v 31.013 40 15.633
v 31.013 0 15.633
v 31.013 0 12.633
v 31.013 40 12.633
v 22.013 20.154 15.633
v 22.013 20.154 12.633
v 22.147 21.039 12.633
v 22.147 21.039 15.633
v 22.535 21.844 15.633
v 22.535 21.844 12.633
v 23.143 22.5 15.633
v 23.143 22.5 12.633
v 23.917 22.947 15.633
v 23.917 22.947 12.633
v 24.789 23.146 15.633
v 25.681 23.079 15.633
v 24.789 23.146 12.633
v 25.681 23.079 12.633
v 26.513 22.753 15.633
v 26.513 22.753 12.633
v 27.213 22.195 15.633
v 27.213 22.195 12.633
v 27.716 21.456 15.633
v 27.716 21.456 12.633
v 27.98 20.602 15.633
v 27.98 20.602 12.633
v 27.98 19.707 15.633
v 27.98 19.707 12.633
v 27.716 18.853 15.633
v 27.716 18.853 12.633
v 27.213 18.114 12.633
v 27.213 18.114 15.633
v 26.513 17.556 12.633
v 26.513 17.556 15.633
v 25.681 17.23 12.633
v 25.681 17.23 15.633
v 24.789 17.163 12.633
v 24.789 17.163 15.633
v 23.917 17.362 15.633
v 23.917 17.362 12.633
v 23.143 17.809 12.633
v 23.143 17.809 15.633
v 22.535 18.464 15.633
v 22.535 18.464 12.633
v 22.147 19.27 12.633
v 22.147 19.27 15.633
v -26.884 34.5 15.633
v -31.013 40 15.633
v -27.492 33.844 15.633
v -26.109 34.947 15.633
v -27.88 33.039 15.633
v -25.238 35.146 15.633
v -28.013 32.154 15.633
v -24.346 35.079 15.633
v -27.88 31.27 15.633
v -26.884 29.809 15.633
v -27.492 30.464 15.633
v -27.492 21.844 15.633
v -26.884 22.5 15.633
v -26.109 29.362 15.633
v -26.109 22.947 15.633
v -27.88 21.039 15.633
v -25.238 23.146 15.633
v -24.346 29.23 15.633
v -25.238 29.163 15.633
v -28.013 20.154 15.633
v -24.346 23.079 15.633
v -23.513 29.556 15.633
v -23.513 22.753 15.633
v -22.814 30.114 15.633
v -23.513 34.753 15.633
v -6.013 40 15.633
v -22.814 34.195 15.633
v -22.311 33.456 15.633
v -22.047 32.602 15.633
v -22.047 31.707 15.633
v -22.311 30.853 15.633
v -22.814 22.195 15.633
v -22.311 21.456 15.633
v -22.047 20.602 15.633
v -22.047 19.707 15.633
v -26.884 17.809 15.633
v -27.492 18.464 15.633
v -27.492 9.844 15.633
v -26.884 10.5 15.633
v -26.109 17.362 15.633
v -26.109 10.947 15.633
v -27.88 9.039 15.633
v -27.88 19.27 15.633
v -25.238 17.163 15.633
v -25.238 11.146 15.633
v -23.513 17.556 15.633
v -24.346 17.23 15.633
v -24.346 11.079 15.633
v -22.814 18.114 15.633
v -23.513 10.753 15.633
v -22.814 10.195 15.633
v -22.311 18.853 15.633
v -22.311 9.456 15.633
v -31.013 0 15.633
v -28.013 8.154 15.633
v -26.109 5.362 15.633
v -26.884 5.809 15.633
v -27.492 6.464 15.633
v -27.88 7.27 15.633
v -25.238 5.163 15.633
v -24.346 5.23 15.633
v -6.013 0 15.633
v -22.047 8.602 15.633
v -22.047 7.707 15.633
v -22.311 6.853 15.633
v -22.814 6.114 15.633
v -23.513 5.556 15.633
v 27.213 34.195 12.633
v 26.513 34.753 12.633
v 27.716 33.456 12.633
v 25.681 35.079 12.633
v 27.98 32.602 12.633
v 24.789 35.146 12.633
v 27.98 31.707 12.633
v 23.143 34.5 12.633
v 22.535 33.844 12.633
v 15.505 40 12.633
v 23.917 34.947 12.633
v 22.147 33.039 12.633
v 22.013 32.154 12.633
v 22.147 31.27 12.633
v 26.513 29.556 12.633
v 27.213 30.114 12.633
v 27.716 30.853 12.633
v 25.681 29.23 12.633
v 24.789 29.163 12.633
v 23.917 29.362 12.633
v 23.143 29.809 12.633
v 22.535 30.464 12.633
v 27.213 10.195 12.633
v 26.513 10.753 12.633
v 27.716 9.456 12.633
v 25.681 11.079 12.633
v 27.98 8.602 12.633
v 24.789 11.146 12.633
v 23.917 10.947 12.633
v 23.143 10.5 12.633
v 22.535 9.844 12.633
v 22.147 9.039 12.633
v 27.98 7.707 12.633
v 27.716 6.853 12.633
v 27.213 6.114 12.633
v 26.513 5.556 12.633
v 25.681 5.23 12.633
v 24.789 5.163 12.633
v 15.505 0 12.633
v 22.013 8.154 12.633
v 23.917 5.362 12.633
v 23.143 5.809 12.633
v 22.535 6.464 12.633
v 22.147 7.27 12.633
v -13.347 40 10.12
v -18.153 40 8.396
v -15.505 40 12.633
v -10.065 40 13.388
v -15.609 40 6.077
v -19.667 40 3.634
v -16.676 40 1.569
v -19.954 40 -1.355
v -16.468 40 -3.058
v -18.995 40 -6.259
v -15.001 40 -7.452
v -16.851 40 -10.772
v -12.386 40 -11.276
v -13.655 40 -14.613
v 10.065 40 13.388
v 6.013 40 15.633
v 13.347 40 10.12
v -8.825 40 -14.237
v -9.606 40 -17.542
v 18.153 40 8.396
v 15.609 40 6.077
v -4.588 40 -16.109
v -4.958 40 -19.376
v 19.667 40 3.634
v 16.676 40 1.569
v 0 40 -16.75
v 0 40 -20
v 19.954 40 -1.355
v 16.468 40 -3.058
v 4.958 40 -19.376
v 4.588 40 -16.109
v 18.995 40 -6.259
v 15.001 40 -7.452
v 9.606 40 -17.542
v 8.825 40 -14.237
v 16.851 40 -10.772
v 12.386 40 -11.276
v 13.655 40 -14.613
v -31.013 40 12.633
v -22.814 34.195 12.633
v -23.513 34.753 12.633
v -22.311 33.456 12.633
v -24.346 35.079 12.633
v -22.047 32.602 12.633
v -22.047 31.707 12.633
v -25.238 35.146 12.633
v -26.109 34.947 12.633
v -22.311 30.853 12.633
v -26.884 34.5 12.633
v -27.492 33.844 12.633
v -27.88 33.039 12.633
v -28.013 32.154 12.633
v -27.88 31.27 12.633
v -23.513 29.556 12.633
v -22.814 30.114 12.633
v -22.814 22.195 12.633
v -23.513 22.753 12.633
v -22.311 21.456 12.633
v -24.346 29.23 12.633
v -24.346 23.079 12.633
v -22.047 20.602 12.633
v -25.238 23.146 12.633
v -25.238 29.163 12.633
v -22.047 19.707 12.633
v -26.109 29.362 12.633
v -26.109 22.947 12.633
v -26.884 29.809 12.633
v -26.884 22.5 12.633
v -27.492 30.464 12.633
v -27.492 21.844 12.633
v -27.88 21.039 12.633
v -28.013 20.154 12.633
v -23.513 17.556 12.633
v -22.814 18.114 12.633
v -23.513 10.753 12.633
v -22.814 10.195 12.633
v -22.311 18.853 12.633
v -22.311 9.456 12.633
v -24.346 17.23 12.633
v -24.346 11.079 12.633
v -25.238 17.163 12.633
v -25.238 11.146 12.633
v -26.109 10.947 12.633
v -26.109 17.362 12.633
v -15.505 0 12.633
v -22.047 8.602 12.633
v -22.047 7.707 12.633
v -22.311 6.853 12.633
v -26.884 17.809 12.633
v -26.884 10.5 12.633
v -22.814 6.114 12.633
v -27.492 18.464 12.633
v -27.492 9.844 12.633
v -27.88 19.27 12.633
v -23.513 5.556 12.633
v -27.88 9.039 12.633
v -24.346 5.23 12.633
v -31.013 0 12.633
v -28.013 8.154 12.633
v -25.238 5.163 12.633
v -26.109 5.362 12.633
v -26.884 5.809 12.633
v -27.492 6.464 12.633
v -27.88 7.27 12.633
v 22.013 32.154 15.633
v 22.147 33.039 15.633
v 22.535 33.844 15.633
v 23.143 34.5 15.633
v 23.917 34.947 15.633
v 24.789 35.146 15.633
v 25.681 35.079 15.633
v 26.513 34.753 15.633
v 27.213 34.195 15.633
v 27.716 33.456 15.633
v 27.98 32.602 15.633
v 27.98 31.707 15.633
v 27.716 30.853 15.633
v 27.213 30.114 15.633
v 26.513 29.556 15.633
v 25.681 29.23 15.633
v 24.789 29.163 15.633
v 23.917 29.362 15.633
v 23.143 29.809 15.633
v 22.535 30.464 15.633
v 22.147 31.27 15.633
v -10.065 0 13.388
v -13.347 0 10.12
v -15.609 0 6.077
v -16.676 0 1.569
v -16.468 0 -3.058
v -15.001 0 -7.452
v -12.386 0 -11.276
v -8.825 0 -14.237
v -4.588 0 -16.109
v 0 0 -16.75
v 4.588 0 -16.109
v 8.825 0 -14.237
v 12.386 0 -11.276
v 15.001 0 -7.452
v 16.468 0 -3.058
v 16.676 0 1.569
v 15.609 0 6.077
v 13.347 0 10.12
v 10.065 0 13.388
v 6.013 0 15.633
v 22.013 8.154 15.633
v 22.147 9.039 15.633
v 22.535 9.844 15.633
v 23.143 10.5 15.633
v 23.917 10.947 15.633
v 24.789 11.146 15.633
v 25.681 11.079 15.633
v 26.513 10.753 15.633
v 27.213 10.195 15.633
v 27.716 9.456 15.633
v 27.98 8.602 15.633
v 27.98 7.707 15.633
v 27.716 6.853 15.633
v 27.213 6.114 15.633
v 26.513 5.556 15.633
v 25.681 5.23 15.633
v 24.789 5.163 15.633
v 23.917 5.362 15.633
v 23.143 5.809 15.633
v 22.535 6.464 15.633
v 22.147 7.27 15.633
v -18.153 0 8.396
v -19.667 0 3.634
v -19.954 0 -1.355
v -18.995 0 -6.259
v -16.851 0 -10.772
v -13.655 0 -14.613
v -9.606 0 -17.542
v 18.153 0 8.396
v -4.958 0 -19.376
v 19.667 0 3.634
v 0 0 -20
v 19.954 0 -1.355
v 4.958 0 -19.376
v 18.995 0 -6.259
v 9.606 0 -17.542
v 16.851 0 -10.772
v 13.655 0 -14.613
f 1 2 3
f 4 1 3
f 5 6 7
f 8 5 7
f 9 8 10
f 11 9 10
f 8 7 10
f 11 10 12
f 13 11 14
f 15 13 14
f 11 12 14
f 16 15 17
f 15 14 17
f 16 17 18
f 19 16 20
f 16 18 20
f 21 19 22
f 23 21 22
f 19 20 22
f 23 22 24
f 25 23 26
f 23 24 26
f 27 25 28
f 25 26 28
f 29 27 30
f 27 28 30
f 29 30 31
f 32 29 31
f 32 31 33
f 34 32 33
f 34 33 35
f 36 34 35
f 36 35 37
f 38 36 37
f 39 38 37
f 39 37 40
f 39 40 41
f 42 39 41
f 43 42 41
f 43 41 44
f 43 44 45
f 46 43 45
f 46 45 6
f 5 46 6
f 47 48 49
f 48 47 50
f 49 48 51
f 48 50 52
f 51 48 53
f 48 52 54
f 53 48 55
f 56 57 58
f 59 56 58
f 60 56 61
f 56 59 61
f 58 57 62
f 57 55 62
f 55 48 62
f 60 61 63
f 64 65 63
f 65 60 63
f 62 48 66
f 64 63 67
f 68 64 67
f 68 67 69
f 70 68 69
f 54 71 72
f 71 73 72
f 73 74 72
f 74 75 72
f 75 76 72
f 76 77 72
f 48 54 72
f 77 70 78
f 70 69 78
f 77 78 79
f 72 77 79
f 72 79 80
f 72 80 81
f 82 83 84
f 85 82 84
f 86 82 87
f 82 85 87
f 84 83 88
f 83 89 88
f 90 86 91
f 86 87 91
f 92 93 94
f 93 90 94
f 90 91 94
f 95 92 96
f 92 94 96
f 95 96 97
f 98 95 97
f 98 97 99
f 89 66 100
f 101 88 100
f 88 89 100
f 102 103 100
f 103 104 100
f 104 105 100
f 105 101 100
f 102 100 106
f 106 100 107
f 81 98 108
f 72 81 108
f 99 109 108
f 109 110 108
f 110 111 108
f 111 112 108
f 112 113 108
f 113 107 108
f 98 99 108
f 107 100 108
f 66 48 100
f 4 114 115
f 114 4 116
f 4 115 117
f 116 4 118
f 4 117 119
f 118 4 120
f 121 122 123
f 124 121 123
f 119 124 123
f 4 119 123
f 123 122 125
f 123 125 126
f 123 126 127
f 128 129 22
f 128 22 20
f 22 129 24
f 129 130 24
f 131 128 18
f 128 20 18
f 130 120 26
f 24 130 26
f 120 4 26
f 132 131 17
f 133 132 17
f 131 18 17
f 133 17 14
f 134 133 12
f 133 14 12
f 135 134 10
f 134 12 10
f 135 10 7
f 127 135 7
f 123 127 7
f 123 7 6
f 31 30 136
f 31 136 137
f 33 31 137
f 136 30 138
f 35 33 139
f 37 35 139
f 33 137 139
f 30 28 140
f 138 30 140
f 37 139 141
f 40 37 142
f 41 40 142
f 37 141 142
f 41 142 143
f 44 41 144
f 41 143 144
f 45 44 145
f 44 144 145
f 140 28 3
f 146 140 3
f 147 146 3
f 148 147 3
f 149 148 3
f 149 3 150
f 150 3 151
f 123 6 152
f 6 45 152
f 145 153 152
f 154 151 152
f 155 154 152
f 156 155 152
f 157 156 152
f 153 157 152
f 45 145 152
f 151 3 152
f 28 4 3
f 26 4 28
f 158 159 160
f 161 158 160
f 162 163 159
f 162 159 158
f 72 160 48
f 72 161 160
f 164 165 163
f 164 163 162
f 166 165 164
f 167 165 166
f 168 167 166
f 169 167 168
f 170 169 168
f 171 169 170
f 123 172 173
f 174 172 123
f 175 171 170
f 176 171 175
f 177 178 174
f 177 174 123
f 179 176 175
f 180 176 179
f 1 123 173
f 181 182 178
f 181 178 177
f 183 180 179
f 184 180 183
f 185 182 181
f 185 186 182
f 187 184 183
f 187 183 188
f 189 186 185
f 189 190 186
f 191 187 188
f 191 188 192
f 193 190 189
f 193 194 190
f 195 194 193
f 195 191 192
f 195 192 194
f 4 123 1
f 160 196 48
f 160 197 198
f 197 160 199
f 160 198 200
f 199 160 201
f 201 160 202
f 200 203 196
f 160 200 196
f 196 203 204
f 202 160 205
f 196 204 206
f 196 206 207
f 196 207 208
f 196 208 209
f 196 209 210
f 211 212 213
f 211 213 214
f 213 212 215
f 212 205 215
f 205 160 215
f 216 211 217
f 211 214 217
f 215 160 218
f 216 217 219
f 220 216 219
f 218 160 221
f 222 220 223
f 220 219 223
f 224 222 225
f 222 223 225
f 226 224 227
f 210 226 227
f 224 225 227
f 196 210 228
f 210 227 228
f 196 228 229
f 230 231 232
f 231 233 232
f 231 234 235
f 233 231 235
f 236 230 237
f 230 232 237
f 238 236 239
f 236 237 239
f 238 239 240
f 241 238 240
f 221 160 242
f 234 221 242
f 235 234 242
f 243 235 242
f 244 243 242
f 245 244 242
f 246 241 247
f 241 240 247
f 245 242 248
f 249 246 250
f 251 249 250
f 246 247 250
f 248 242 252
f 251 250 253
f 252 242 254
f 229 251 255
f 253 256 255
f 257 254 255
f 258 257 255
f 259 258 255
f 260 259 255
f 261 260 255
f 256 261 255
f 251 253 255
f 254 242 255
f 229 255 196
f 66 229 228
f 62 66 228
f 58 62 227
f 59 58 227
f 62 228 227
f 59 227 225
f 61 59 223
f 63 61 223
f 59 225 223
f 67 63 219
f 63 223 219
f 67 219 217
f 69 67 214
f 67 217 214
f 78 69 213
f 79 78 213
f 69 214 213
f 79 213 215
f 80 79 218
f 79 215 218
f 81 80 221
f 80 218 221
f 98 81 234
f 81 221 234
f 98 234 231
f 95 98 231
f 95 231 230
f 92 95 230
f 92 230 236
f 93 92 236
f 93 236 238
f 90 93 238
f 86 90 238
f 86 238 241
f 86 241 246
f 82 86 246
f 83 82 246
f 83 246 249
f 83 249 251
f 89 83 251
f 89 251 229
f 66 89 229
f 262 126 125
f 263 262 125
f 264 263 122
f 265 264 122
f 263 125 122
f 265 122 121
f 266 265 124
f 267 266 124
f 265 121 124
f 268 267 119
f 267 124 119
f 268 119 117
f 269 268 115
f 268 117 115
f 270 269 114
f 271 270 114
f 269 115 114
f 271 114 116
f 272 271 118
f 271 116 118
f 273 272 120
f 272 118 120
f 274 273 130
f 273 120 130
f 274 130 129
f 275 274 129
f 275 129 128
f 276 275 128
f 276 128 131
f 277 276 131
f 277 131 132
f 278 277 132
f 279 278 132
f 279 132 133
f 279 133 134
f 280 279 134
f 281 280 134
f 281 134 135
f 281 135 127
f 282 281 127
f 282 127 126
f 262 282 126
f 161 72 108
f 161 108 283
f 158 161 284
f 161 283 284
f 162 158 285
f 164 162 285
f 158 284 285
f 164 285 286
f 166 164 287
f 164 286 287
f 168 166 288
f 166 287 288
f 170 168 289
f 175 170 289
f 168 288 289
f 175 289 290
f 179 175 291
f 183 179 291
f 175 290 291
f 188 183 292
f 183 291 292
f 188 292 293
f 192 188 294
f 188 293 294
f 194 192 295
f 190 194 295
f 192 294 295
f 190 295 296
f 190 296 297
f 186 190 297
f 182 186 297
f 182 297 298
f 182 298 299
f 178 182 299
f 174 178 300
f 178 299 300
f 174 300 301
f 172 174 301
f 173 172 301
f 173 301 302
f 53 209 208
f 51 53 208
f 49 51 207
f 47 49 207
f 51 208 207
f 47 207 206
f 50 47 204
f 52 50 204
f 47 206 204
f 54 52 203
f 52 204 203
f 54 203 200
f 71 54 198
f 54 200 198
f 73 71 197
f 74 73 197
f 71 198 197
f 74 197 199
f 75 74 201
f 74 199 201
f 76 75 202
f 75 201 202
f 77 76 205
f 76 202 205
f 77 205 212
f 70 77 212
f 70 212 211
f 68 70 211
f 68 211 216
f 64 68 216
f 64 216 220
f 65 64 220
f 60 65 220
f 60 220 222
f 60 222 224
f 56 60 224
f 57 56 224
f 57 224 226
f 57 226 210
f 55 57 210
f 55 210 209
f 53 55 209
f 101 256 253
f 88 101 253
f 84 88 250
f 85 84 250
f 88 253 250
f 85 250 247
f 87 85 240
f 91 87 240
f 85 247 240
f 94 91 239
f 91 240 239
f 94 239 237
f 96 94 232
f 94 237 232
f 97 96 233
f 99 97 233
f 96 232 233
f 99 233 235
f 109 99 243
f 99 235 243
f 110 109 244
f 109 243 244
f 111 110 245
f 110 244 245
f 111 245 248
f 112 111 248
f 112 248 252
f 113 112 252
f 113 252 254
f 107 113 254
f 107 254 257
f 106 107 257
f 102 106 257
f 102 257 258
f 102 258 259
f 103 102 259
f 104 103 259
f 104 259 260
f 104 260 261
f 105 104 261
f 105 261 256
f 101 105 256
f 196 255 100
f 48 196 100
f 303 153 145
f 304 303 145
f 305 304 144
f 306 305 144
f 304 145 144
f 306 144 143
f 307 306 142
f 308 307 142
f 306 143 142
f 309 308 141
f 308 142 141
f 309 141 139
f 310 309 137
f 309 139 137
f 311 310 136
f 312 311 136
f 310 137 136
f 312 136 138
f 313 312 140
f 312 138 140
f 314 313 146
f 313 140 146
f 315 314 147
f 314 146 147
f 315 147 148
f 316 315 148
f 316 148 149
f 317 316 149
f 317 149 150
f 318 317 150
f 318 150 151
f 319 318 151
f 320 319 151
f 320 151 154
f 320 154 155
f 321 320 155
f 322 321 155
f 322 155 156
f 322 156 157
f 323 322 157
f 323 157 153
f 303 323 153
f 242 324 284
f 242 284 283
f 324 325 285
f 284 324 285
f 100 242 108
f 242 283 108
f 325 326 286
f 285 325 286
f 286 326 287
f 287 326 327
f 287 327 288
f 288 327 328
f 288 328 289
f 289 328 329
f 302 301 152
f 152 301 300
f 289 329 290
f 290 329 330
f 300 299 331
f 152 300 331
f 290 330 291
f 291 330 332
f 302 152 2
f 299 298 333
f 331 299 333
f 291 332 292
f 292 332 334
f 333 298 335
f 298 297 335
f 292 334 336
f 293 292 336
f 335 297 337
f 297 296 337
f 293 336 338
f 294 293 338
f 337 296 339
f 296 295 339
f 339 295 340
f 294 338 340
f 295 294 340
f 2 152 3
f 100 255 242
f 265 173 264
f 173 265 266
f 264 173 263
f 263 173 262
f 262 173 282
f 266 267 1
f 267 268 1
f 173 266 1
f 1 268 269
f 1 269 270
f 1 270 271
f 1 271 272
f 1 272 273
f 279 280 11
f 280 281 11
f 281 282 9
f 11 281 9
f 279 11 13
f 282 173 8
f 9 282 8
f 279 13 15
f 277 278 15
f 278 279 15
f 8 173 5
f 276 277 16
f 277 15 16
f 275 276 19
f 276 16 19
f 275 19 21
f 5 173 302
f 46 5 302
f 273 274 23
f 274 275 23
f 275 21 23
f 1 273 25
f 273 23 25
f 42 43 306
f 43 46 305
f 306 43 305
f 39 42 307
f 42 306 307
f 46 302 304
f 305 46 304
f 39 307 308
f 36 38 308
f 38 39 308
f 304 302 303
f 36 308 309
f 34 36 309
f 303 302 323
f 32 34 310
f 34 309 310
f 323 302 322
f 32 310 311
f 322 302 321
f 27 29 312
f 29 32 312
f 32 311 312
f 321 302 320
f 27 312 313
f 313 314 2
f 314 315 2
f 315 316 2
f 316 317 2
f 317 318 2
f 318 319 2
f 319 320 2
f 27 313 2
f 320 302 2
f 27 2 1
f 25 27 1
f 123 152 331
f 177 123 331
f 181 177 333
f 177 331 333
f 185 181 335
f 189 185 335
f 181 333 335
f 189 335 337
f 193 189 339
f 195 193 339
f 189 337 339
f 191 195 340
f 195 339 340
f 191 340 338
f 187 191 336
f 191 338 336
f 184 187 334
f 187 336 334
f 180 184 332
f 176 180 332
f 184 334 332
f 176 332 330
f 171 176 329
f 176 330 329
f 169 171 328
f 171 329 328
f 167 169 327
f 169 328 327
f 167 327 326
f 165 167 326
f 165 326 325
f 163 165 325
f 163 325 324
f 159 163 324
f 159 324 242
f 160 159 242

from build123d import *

# Parameters (mm, degrees)
SALIENTE_EXTRUIR1_DEPTH = 40
CROQUIS2_R              = 3
CORTAR_EXTRUIR1_DEPTH   = 10


with BuildPart() as part:
    # Croquis1 → Saliente-Extruir1 (new body)
    with BuildSketch(Plane(origin=(0, 0, 0), x_dir=(1, 0, 0), z_dir=(0, 1, 0))):
        with BuildLine():
            Line((6.013434035, -15.633333333), (31.013434035, -15.633333333))
            Line((31.013434035, -15.633333333), (31.013434035, -12.633333333))
            Line((31.013434035, -12.633333333), (15.504802123, -12.633333333))
            ThreePointArc((15.504802123, -12.633333333), (0, 20), (-15.504802123, -12.633333333))
            Line((-15.504802123, -12.633333333), (-31.013434035, -12.633333333))
            Line((-31.013434035, -12.633333333), (-31.013434035, -15.633333333))
            Line((-31.013434035, -15.633333333), (-6.013434035, -15.633333333))
            ThreePointArc((-6.013434035, -15.633333333), (0, 16.75), (6.013434035, -15.633333333))
        make_face()
    extrude(amount=SALIENTE_EXTRUIR1_DEPTH)

    # Croquis2 → Cortar-Extruir1 (cut)
    with BuildSketch(Plane(origin=(0, 0, 12.633333333), x_dir=(-1, 0, 0), z_dir=(0, 0, -1))):
        with Locations((25.013434035, 8.154431535)):
            Circle(CROQUIS2_R)
        with Locations((25.013434035, 20.154431535)):
            Circle(CROQUIS2_R)
        with Locations((25.013434035, 32.154431535)):
            Circle(CROQUIS2_R)
        with Locations((-25.013434035, 32.154431535)):
            Circle(CROQUIS2_R)
        with Locations((-25.013434035, 8.154431535)):
            Circle(CROQUIS2_R)
        with Locations((-25.013434035, 20.154431535)):
            Circle(CROQUIS2_R)
    extrude(amount=-CORTAR_EXTRUIR1_DEPTH, mode=Mode.SUBTRACT)


solid = part.part
